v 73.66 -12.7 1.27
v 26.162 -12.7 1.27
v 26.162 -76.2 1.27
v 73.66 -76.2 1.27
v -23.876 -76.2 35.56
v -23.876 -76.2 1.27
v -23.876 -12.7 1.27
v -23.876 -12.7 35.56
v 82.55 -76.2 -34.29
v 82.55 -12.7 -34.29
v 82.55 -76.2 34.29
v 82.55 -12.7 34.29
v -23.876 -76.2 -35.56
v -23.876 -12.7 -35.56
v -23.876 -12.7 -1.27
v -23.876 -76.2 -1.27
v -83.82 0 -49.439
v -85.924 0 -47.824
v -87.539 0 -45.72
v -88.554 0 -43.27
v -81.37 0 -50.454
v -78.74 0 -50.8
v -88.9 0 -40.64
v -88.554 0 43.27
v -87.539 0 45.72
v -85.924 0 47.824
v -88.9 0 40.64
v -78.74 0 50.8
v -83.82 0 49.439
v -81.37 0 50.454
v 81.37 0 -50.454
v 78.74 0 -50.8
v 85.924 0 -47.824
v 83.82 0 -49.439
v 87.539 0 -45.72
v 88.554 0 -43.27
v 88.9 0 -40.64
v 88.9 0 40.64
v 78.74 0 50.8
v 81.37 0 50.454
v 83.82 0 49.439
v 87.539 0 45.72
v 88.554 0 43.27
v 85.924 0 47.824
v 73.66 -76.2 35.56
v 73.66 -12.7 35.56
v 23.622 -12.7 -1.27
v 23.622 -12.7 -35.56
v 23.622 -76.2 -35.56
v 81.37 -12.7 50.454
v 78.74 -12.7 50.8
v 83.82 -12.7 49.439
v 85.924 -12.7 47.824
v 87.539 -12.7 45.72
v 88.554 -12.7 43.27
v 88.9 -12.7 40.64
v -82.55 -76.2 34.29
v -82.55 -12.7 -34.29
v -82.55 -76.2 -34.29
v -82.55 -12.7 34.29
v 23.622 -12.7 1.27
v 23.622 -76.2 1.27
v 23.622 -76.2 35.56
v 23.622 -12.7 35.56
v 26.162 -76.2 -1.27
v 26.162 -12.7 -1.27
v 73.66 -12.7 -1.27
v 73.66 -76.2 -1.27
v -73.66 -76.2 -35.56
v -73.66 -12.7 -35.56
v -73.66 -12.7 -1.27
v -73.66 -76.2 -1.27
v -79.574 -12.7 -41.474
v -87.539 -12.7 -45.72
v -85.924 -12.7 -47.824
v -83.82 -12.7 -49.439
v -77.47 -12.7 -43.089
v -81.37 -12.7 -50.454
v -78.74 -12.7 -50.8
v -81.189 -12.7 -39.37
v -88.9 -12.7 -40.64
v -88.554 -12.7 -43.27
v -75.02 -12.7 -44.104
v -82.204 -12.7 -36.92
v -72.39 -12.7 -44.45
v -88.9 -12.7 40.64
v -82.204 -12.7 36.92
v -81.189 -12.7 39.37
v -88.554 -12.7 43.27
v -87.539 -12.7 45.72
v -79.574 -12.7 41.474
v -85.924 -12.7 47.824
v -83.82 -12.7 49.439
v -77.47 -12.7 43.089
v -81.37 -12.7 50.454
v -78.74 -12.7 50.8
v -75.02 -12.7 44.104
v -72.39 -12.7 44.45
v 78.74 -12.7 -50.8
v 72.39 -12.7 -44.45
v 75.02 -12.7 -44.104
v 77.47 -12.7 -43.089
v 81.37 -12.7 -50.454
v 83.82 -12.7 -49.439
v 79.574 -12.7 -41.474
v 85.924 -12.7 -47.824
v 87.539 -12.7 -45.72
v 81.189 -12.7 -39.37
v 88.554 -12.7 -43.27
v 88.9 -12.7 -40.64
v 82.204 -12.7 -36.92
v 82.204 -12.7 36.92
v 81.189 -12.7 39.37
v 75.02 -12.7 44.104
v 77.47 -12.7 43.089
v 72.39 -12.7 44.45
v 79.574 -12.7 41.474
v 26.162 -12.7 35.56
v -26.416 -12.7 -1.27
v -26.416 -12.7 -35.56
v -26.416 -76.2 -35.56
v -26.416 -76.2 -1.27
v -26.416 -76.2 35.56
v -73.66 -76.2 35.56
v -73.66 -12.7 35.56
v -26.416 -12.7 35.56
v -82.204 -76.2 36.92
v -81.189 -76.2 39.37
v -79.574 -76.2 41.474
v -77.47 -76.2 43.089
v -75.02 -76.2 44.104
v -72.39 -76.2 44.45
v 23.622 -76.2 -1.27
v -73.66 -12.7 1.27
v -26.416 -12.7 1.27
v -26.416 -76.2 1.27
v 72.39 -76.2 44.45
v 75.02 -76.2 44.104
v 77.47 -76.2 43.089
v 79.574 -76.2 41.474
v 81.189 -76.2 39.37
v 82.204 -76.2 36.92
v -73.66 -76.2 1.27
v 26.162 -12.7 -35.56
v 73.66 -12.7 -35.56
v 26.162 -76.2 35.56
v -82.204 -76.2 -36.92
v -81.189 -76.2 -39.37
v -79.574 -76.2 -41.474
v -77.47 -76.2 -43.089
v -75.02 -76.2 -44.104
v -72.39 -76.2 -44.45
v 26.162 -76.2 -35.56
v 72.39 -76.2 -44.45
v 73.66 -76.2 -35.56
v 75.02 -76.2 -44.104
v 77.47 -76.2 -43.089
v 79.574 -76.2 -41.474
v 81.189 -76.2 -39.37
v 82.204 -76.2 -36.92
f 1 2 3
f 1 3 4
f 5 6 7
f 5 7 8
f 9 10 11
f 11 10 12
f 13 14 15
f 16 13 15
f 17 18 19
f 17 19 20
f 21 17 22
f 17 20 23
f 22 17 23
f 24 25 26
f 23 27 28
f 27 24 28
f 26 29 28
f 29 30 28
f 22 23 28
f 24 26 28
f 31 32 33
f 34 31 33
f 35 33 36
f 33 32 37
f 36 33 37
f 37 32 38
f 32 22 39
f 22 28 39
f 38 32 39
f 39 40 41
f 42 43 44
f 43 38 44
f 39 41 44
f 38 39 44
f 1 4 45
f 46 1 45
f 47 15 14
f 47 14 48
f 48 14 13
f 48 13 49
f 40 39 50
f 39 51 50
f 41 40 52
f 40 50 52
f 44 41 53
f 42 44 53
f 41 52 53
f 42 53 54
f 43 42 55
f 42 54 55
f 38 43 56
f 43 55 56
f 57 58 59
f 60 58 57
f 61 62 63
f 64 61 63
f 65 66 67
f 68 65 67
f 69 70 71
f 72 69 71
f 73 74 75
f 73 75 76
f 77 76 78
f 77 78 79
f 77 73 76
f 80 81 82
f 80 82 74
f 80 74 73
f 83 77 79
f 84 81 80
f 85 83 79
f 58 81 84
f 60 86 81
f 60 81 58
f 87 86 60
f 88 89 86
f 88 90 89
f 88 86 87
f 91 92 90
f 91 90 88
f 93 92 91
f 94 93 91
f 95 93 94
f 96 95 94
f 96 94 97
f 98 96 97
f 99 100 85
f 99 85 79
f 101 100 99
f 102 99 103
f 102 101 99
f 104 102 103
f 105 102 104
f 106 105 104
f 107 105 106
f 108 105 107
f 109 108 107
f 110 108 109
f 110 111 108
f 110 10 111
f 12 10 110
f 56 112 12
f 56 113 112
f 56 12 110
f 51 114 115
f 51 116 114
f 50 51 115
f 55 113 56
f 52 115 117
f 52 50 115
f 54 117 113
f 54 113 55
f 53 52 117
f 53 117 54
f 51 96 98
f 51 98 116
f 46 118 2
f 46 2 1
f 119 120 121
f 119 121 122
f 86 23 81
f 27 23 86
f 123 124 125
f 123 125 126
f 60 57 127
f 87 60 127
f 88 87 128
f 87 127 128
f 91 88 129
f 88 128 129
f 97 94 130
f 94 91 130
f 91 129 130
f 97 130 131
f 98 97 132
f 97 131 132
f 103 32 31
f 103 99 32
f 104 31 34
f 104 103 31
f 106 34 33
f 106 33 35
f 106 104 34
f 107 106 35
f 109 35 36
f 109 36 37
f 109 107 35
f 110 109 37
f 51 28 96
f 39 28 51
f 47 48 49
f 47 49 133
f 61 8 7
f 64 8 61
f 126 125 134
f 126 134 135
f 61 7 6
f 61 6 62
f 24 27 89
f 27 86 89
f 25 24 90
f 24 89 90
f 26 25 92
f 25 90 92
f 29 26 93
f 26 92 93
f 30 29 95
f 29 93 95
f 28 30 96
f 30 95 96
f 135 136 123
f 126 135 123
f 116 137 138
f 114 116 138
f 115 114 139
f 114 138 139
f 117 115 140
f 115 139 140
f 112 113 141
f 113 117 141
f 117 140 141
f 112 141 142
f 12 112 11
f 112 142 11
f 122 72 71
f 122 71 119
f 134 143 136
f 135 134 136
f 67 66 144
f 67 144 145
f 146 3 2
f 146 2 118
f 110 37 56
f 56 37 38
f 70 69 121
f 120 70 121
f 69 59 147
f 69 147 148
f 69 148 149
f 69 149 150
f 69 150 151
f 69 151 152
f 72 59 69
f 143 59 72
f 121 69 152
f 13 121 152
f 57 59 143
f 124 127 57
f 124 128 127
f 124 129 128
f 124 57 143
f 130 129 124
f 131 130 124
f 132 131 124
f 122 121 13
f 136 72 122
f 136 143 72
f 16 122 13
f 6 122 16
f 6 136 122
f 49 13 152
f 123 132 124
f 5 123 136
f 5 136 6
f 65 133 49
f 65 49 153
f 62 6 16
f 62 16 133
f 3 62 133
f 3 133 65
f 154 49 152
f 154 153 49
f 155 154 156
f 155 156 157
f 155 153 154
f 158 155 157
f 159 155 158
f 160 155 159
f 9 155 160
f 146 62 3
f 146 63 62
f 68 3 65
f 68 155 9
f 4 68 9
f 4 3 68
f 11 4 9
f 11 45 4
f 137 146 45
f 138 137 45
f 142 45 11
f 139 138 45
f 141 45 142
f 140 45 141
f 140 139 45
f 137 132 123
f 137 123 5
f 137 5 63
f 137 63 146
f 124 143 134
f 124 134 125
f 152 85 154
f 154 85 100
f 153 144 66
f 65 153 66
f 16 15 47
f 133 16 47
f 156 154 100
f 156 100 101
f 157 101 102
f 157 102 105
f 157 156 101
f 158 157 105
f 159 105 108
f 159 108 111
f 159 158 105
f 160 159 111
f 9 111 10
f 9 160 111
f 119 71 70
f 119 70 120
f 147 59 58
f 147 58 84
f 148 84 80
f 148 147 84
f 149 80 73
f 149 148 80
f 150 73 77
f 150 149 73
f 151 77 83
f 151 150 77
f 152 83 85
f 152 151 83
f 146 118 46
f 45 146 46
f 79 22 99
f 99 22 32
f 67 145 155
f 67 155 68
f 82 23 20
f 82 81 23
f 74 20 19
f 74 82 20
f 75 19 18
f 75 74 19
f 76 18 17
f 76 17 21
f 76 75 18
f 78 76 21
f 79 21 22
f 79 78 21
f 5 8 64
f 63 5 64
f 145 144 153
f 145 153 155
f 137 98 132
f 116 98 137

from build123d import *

# Parameters (mm, degrees)
F0_W     = 165.1
F0_H     = 88.9
F0_W_2   = 152.4
F0_H_2   = 76.2
F1_DEPTH = 76.2
F0_W_3   = 47.244
F0_H_3   = 34.29
F0_W_4   = 47.498
F2_DEPTH = 76.2
F3_R     = 10.16
F4_W     = 177.8
F4_H     = 101.6
F5_DEPTH = 12.7
F6_R     = 10.16


# Not quite as in the source:
# - a feature names something its author has since deleted; it is built from what else it names


with BuildPart() as f1:
    # F0 (on Front) → F1 (new body)
    with BuildSketch(Plane.XZ):
        Rectangle(F0_W, F0_H)
        Rectangle(F0_W_2, F0_H_2, mode=Mode.SUBTRACT)
    extrude(amount=F1_DEPTH)

    # F0 (on Front) → F2 (join)
    with BuildSketch(Plane.XZ):
        Rectangle(F0_W_2, F0_H_2)
        with Locations((-50.038, -18.415)):
            Rectangle(F0_W_3, F0_H_3, mode=Mode.SUBTRACT)
        with Locations((-0.127, -18.415)):
            Rectangle(F0_W_4, F0_H_3, mode=Mode.SUBTRACT)
        with Locations((49.911, -18.415)):
            Rectangle(F0_W_4, F0_H_3, mode=Mode.SUBTRACT)
        with Locations((-50.038, 18.415)):
            Rectangle(F0_W_3, F0_H_3, mode=Mode.SUBTRACT)
        with Locations((-0.127, 18.415)):
            Rectangle(F0_W_4, F0_H_3, mode=Mode.SUBTRACT)
        with Locations((49.911, 18.415)):
            Rectangle(F0_W_4, F0_H_3, mode=Mode.SUBTRACT)
    extrude(amount=F2_DEPTH)

    # F3
    f3_edges = [f1.edges().sort_by_distance(p)[0] for p in [
        (-82.55, -38.1, -44.45),
        (82.55, -38.1, -44.45),
        (-82.55, -38.1, 44.45),
        (82.55, -38.1, 44.45),
    ]]
    fillet(f3_edges, radius=F3_R)

    # F4 (on Front) → F5 (join)
    with BuildSketch(Plane.XZ):
        Rectangle(F4_W, F4_H)
    extrude(amount=F5_DEPTH)

    # F6
    f6_edges = [f1.edges().sort_by_distance(p)[0] for p in [
        (-88.9, -6.35, 50.8),
        (88.9, -6.35, 50.8),
        (-88.9, -6.35, -50.8),
        (88.9, -6.35, -50.8),
    ]]
    fillet(f6_edges, radius=F6_R)


solid = f1.part
